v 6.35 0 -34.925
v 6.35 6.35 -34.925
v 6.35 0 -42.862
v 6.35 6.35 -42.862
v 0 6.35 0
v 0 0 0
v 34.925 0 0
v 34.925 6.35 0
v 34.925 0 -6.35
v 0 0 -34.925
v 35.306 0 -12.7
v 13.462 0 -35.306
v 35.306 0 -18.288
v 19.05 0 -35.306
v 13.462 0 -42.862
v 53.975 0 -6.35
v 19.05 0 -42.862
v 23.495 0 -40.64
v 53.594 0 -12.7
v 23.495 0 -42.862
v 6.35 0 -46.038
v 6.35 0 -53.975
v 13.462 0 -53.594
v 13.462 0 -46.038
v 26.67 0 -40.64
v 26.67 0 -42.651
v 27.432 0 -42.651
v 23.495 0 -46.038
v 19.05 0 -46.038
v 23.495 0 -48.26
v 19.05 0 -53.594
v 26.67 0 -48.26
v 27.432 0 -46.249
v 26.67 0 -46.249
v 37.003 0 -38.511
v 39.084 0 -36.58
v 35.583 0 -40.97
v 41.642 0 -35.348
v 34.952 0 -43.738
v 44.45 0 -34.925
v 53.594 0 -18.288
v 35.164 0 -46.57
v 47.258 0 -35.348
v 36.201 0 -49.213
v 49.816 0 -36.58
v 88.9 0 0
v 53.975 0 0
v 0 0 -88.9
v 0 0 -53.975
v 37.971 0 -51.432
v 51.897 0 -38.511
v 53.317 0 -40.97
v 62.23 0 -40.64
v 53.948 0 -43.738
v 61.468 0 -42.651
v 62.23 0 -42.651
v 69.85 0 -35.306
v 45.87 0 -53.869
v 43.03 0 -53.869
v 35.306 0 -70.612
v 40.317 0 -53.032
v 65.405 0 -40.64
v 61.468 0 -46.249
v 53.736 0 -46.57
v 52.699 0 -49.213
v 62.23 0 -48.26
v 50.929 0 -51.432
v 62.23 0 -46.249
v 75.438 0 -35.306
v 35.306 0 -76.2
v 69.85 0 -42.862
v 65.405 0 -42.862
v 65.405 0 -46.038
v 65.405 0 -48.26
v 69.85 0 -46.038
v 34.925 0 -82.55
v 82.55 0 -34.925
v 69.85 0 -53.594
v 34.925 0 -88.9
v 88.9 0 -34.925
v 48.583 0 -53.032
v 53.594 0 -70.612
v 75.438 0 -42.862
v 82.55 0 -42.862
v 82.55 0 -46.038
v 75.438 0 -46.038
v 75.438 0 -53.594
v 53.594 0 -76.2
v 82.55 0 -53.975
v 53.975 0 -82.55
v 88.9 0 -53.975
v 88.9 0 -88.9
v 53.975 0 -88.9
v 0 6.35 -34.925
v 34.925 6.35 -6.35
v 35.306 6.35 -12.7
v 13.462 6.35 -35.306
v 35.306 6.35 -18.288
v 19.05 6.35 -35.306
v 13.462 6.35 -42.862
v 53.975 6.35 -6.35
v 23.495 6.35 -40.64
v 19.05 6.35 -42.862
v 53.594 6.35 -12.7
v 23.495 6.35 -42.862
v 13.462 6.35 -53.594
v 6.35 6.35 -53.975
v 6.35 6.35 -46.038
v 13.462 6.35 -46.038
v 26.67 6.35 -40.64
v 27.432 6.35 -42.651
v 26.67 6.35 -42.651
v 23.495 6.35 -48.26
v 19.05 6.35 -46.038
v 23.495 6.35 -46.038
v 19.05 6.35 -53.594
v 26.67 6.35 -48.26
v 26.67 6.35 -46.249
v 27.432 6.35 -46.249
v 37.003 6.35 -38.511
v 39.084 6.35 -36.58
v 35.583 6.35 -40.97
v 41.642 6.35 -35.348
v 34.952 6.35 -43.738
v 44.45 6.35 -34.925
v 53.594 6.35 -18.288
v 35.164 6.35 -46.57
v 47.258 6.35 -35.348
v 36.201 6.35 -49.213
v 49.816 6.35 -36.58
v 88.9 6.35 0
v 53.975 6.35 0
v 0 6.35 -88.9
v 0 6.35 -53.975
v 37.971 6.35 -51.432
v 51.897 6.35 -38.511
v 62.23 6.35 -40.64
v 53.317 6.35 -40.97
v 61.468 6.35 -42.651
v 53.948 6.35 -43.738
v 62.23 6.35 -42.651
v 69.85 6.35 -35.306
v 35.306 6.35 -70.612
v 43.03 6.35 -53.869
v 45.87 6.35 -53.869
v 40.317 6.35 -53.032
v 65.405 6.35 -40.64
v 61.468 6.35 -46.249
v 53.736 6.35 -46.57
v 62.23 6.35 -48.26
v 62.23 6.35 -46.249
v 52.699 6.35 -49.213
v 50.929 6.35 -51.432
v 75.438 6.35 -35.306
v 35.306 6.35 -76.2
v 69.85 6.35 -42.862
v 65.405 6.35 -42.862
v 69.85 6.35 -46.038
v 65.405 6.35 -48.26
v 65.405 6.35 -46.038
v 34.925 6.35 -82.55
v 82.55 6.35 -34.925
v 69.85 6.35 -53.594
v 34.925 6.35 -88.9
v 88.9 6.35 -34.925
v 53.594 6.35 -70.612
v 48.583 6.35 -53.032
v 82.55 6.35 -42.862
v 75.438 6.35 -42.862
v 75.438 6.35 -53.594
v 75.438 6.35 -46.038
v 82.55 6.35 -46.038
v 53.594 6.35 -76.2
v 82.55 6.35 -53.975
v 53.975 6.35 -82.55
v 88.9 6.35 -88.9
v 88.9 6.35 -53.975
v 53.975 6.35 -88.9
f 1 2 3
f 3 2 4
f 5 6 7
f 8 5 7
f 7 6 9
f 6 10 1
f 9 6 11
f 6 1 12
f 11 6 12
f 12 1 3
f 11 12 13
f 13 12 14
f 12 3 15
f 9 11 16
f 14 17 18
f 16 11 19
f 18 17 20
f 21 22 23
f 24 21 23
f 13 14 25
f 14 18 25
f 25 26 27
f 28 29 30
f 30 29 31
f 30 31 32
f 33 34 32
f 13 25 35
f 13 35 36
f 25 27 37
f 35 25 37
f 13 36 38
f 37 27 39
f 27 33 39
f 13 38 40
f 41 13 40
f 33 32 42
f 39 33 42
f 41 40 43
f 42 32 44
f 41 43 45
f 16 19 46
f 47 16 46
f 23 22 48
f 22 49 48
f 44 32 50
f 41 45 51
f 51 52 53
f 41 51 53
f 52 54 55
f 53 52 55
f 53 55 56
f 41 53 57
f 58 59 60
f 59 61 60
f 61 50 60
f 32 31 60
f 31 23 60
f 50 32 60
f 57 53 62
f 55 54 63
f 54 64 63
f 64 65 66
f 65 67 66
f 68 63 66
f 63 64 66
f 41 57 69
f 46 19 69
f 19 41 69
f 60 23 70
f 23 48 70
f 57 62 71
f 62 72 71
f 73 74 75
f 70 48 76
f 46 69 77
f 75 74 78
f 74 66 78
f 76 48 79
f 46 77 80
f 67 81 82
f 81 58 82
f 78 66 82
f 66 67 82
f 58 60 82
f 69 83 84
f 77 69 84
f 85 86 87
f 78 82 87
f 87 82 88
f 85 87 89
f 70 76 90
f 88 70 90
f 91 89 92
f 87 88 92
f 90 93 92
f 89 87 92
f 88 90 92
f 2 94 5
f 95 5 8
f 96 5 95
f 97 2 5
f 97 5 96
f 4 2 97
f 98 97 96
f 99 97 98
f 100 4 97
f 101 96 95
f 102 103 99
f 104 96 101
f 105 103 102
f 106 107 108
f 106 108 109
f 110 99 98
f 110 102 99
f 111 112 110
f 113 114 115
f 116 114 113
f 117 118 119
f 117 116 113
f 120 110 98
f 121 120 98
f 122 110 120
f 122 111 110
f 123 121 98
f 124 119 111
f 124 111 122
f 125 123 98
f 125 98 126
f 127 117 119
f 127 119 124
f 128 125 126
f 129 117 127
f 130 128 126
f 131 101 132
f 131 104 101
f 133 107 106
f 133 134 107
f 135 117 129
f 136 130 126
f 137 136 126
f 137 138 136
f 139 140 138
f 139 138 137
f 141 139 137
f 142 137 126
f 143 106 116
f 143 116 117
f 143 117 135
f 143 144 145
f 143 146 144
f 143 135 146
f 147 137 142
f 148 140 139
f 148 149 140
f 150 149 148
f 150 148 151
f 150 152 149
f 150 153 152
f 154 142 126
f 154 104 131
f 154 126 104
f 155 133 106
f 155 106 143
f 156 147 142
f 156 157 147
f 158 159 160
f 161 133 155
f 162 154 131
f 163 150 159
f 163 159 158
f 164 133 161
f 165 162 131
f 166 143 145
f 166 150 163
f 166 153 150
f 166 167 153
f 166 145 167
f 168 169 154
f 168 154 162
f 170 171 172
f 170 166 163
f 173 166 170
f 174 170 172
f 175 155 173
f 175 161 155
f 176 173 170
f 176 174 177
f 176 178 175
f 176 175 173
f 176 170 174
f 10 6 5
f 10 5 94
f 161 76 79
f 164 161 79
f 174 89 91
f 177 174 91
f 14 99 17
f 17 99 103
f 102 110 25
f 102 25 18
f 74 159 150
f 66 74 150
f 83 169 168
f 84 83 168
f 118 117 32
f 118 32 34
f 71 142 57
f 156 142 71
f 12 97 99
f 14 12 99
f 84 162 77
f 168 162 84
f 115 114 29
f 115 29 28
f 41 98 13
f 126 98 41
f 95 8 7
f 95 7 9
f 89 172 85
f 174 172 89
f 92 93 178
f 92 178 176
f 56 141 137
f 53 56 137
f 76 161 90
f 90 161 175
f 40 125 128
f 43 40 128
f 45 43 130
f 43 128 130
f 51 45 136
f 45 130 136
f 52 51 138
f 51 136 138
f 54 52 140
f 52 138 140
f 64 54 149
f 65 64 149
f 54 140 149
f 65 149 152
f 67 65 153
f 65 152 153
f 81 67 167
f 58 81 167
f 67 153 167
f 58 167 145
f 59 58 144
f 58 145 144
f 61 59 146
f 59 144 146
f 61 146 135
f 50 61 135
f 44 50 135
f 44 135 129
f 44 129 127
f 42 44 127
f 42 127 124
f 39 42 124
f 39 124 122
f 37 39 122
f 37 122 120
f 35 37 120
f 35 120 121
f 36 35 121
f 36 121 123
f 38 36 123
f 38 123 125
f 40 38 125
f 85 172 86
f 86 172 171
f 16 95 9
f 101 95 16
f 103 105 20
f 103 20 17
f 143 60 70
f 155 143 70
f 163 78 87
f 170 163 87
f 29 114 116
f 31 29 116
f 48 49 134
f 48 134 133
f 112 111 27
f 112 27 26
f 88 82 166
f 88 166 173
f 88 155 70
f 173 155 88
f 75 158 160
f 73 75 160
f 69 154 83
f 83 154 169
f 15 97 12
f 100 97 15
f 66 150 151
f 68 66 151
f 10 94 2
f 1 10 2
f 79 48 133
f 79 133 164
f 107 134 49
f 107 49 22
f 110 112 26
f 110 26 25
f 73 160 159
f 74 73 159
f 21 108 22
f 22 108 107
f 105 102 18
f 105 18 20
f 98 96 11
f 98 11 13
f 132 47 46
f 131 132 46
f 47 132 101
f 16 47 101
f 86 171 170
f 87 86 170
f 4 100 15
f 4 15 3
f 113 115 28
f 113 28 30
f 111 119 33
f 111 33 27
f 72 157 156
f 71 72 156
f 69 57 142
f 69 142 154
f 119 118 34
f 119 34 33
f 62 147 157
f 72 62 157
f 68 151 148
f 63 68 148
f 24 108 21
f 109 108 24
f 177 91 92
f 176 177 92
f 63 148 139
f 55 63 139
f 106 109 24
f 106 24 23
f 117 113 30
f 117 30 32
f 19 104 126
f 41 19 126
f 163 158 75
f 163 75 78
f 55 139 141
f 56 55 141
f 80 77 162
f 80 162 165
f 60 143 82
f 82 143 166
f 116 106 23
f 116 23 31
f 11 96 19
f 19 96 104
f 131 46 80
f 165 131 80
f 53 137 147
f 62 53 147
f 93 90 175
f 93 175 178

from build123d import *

# Parameters (mm, degrees)
SKETCH1_W           = 88.9
SKETCH1_H           = 88.9
BOSS_EXTRUDE1_DEPTH = 6.35
SKETCH2_R           = 9.525
SKETCH2_W           = 18.288
SKETCH2_H           = 5.588
SKETCH2_W_2         = 5.588
SKETCH2_H_2         = 18.288
CUT_EXTRUDE1_DEPTH  = 126.88384527
SKETCH3_W           = 19.05
SKETCH3_H           = 6.35
SKETCH3_W_2         = 6.35
SKETCH3_H_2         = 19.05
CUT_EXTRUDE2_DEPTH  = 126.88384527
CUT_EXTRUDE3_DEPTH  = 126.88384527


with BuildPart() as part:
    # Sketch1 → Boss-Extrude1 (new body)
    with BuildSketch(Plane(origin=(0, 0, 0), x_dir=(1, 0, 0), z_dir=(0, 1, 0))):
        with Locations((44.45, 44.45)):
            Rectangle(SKETCH1_W, SKETCH1_H)
    extrude(amount=BOSS_EXTRUDE1_DEPTH)

    # Sketch2 → Cut-Extrude1 (cut, through all)
    with BuildSketch(Plane(origin=(0, 6.35, 0), x_dir=(1, 0, 0), z_dir=(0, 1, 0))):
        with Locations(Location((44.45, 44.45, 0), (0, 0, 270))):
            Circle(SKETCH2_R)
        with Locations((44.45, 73.406)):
            Rectangle(SKETCH2_W, SKETCH2_H)
        with Locations((16.256, 44.45)):
            Rectangle(SKETCH2_W_2, SKETCH2_H_2)
        with Locations((72.644, 44.45)):
            Rectangle(SKETCH2_W_2, SKETCH2_H_2)
        with Locations((44.45, 15.494)):
            Rectangle(SKETCH2_W, SKETCH2_H)
    extrude(amount=-CUT_EXTRUDE1_DEPTH, mode=Mode.SUBTRACT)

    # Sketch3 → Cut-Extrude2 (cut, through all)
    with BuildSketch(Plane(origin=(0, 6.35, 0), x_dir=(1, 0, 0), z_dir=(0, 1, 0))):
        with Locations((44.45, 85.725)):
            Rectangle(SKETCH3_W, SKETCH3_H)
        with Locations((85.725, 44.45)):
            Rectangle(SKETCH3_W_2, SKETCH3_H_2)
        with Locations((44.45, 3.175)):
            Rectangle(SKETCH3_W, SKETCH3_H)
        with Locations((3.175, 44.45)):
            Rectangle(SKETCH3_W_2, SKETCH3_H_2)
    extrude(amount=-CUT_EXTRUDE2_DEPTH, mode=Mode.SUBTRACT)

    # Sketch4 → Cut-Extrude3 (cut, through all)
    with BuildSketch(Plane(origin=(0, 6.35, 0), x_dir=(1, 0, 0), z_dir=(0, 1, 0))):
        Polygon((23.495, 46.0375), (23.495, 48.26), (26.67, 48.26), (26.67, 46.249166667), (27.432, 46.249166667), (27.432, 42.650833333), (26.67, 42.650833333), (26.67, 40.64), (23.495, 40.64), (23.495, 42.8625), (6.35, 42.8625), (6.35, 46.0375), align=None)
        Polygon((62.23, 46.249166667), (61.468, 46.249166667), (61.468, 42.650833333), (62.23, 42.650833333), (62.23, 40.64), (65.405, 40.64), (65.405, 42.8625), (82.55, 42.8625), (82.55, 46.0375), (65.405, 46.0375), (65.405, 48.26), (62.23, 48.26), align=None)
    extrude(amount=-CUT_EXTRUDE3_DEPTH, mode=Mode.SUBTRACT)


solid = part.part
